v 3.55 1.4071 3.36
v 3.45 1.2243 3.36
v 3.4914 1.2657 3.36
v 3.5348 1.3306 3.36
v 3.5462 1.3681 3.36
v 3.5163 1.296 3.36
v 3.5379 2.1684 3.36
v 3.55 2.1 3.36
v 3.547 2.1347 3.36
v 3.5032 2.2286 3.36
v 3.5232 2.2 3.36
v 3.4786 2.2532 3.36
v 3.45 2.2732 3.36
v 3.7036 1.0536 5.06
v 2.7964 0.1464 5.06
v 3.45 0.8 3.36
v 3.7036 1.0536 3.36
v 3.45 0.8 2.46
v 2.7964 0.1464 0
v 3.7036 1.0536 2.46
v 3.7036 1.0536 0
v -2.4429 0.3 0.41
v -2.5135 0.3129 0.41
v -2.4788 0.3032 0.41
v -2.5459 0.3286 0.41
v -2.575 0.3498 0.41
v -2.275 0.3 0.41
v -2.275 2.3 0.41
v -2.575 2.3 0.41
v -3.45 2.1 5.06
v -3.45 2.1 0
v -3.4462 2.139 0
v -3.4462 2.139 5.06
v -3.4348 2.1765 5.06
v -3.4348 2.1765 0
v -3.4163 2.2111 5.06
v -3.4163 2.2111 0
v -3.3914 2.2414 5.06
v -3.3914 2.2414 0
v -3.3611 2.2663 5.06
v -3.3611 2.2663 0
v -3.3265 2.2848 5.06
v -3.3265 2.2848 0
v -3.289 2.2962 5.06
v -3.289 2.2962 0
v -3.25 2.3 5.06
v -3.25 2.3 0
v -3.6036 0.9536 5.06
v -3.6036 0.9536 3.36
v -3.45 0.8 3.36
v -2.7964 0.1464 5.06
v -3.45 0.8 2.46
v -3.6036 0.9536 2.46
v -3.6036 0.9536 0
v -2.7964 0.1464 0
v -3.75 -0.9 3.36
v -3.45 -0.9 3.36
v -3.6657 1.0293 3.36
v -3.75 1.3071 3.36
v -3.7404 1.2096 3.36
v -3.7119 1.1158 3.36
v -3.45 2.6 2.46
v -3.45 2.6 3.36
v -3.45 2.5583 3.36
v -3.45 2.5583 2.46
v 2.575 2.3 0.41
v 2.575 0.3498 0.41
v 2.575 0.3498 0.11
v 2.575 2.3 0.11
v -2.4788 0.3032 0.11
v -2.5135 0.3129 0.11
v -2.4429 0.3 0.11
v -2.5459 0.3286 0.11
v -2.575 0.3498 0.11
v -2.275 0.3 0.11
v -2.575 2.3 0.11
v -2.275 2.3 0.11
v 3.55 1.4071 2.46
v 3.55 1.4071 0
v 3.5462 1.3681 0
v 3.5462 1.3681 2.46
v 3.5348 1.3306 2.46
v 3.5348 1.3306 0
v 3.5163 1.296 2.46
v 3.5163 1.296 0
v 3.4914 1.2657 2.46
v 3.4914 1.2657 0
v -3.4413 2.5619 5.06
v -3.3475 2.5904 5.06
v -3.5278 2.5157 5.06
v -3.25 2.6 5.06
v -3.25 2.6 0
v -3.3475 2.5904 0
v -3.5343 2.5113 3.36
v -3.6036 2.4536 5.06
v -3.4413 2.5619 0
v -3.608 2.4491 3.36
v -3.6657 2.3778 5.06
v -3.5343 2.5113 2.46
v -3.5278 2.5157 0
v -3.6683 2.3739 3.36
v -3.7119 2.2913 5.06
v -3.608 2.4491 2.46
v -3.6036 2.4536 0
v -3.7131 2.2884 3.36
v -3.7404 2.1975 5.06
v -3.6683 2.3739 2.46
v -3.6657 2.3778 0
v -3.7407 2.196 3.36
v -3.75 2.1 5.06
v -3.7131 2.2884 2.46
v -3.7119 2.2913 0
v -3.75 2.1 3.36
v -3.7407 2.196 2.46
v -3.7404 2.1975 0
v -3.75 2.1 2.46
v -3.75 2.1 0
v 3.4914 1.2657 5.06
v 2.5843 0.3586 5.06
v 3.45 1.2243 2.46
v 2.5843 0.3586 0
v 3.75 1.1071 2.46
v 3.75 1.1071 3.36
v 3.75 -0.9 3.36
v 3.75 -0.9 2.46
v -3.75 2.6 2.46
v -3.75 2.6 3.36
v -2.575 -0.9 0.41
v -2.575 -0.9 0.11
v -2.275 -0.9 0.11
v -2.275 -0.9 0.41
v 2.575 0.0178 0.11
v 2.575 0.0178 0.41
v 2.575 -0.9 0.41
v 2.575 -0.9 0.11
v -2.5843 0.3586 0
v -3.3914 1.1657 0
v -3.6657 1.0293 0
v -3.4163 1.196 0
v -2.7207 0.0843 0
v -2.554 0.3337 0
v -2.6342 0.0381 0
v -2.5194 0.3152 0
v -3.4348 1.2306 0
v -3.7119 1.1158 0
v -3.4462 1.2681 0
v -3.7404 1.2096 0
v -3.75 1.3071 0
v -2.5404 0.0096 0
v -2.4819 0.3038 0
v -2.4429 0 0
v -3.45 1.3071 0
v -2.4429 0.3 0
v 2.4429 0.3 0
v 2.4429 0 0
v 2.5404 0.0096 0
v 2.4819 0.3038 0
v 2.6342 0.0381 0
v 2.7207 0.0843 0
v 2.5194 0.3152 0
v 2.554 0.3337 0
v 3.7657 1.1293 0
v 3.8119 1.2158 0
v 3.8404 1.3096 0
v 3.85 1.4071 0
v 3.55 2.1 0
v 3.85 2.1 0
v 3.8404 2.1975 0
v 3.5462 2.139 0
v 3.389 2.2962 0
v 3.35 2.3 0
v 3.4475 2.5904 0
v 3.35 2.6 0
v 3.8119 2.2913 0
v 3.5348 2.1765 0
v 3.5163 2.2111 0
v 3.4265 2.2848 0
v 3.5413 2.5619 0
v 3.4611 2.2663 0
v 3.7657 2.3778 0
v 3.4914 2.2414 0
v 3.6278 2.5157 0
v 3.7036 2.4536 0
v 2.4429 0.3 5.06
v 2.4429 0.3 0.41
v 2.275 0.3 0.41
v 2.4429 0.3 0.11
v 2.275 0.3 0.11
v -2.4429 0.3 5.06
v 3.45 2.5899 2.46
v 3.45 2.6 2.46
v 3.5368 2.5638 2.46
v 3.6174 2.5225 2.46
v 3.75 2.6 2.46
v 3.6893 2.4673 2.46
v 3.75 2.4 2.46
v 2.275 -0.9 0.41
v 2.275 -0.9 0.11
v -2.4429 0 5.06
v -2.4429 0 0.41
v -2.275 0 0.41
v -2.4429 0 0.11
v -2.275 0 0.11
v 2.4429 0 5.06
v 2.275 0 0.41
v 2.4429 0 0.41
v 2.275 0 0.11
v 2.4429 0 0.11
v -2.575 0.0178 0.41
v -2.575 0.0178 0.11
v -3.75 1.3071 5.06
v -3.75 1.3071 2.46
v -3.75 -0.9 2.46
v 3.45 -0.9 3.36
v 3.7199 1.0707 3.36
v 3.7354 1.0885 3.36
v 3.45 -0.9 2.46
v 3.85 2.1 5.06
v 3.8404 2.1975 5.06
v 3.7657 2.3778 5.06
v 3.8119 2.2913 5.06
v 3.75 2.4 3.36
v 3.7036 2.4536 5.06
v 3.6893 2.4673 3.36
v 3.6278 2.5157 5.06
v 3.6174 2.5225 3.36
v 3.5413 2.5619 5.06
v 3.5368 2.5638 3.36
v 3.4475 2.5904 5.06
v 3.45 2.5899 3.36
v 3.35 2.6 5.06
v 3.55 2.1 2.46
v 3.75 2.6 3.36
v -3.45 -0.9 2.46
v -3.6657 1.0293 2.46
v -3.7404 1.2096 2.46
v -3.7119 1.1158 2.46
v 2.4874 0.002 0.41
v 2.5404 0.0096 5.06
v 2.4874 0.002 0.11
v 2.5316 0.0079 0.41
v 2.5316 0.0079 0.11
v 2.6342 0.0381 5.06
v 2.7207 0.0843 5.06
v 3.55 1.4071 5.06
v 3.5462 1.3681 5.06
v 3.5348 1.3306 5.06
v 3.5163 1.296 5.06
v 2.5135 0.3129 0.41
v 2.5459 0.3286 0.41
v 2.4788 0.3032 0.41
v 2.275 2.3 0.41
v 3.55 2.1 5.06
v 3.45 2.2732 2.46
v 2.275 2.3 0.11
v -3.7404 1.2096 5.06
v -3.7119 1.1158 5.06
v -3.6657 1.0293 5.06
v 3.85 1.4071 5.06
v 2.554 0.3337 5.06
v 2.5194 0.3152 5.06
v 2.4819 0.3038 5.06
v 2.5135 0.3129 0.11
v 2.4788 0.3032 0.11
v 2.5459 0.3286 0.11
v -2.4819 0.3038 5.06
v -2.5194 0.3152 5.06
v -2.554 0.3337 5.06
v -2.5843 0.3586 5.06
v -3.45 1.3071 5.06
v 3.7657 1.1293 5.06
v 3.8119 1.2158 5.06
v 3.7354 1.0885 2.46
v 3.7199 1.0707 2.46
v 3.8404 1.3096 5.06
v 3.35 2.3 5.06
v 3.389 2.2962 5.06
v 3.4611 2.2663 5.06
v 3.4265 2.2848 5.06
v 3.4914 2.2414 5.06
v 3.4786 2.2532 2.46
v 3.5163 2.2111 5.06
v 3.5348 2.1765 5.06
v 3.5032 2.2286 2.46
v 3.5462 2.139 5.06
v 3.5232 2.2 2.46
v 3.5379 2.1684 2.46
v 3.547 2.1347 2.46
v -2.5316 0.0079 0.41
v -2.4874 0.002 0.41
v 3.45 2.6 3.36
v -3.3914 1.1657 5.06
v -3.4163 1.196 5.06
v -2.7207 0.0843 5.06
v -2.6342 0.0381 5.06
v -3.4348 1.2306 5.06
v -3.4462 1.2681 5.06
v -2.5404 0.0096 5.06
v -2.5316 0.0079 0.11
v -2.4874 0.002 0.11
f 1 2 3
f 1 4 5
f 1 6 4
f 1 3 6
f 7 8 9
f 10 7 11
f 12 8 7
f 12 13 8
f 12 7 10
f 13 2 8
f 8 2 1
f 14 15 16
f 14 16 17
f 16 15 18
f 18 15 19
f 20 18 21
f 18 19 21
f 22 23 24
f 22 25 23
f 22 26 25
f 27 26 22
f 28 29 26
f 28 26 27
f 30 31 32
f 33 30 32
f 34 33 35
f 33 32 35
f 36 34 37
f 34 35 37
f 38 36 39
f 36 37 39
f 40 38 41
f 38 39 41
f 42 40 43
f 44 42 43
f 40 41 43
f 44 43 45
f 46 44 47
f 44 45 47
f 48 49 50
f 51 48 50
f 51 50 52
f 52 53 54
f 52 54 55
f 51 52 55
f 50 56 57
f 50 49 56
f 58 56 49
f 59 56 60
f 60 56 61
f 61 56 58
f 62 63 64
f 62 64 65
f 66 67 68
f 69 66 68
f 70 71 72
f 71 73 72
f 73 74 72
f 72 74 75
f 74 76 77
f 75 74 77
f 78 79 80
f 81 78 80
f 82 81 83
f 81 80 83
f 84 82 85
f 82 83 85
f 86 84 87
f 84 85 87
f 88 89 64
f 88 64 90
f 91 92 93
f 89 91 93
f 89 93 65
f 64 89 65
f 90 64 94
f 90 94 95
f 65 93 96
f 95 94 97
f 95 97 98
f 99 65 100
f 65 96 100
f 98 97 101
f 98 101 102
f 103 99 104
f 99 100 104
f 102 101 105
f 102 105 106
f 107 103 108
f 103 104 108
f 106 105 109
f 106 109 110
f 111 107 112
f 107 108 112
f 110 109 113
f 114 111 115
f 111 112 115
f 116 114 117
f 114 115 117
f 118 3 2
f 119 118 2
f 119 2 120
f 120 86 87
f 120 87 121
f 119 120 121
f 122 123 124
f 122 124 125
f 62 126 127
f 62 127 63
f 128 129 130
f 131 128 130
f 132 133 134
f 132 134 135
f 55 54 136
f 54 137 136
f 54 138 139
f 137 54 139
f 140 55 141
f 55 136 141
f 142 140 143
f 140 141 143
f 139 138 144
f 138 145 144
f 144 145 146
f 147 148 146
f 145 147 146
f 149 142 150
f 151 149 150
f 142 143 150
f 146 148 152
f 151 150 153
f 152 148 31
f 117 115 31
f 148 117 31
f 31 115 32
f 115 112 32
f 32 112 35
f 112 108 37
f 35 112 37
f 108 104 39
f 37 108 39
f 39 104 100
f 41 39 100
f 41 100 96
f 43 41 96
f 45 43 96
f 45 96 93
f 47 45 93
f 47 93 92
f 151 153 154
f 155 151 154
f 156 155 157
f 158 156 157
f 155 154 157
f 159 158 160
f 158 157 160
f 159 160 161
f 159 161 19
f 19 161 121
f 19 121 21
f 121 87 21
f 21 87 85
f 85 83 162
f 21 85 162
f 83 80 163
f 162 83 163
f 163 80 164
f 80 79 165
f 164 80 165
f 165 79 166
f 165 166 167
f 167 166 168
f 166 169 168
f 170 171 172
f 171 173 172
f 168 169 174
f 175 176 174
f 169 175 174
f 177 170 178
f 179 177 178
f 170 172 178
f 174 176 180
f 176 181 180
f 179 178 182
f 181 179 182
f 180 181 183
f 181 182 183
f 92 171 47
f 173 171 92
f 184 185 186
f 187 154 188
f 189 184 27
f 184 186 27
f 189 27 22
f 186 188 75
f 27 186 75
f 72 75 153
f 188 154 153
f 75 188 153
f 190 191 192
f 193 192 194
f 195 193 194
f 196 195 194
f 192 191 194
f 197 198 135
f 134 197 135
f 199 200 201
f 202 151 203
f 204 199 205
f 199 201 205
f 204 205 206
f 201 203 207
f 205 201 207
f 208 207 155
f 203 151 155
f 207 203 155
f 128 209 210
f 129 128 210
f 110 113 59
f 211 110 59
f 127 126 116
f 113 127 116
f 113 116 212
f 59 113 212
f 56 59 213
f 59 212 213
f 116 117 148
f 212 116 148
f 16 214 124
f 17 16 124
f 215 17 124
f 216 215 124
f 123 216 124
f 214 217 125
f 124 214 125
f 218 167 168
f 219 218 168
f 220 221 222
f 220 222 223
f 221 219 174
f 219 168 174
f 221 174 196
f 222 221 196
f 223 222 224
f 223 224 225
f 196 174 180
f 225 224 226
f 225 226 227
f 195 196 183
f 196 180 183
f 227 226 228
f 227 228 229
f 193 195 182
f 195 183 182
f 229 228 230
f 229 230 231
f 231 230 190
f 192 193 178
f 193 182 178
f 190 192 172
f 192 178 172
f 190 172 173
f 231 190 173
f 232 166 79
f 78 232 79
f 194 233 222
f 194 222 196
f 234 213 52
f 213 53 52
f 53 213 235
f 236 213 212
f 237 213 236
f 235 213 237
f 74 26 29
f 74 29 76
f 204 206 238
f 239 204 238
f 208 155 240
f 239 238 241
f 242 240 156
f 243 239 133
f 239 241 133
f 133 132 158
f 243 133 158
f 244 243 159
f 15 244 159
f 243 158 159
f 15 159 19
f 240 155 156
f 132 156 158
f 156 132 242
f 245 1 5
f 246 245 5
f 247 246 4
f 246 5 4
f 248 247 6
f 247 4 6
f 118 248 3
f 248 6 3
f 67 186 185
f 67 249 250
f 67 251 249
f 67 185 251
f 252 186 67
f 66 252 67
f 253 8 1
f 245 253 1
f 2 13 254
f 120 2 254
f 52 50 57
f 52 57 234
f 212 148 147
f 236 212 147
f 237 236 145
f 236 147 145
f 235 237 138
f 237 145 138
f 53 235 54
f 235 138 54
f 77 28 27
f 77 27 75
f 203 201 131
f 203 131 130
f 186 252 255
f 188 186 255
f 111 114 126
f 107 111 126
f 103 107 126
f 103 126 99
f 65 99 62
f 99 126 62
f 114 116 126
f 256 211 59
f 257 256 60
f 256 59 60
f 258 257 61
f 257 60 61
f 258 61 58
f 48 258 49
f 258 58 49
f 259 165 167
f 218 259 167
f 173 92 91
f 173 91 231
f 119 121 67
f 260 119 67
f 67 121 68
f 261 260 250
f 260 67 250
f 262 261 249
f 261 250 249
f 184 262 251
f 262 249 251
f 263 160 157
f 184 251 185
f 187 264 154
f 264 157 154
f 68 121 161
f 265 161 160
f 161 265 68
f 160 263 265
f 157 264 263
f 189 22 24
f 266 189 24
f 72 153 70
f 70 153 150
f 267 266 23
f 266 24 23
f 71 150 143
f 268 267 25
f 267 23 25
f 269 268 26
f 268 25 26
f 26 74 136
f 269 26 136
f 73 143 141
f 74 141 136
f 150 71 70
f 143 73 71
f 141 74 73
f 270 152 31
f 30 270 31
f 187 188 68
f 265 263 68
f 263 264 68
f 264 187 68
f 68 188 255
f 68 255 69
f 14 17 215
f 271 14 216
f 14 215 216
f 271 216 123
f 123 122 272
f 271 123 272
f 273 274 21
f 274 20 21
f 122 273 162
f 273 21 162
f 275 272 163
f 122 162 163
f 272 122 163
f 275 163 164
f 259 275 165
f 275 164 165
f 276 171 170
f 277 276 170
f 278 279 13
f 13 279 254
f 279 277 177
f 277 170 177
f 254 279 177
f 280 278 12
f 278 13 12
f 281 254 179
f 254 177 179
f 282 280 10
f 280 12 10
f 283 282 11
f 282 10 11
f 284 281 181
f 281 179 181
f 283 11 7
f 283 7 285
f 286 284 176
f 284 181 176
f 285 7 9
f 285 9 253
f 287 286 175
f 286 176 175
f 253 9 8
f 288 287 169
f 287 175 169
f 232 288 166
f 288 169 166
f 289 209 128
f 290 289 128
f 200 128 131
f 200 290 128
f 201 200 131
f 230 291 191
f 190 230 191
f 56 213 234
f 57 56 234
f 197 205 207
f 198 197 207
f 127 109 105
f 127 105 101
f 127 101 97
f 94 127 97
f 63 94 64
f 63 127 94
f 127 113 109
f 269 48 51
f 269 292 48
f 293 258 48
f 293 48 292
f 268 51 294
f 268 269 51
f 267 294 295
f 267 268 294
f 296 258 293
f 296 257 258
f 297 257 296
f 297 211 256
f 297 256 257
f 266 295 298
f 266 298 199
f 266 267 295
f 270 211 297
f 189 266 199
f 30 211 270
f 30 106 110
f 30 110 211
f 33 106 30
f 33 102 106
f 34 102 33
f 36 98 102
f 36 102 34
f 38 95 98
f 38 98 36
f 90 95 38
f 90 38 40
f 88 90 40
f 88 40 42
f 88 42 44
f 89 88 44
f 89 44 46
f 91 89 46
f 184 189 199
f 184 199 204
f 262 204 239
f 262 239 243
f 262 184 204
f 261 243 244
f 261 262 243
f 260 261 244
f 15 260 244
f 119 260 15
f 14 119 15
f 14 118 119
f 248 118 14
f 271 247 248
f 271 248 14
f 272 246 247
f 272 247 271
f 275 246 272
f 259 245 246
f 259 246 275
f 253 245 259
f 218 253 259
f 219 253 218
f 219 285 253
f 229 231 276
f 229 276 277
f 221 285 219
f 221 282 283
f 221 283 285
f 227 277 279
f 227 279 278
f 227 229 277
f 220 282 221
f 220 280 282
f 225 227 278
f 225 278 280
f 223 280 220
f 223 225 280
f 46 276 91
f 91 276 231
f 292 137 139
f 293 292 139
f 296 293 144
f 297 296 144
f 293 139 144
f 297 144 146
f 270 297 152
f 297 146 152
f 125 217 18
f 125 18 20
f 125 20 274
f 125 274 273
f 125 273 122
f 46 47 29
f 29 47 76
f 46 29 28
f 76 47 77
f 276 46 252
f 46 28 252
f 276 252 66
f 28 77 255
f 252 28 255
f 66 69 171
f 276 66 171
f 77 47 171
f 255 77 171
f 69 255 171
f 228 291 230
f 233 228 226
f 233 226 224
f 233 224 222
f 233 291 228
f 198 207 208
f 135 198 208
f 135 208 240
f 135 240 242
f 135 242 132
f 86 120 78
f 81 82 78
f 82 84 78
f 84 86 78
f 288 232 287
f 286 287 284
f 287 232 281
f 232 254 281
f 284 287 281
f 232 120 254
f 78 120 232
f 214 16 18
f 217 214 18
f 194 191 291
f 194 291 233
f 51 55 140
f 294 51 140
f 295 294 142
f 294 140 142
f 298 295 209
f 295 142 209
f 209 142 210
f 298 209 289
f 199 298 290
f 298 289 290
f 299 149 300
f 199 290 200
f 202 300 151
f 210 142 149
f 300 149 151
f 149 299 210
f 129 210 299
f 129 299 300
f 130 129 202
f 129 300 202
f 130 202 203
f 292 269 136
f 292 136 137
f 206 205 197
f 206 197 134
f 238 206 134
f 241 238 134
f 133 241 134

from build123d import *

# Parameters (mm, degrees)
EXTRUDE_1_DEPTH     = 5.06
CUT_EXTRUDE_1_REACH = 7.06
SKETCH_2_W          = 0.3
SKETCH_2_H          = 0.3
SKETCH_2_H_2        = 0.9
EXTRUDE_2_DEPTH     = 3.5


with BuildPart() as part:
    # 草图1 → 凸台-拉伸1 (new body)
    with BuildSketch(Plane.XY):
        with BuildLine():
            Line((-3.603553391, 0.953553391), (-2.796446609, 0.146446609))
            ThreePointArc((-2.796446609, 0.146446609), (-2.634234935, 0.038060234), (-2.442893219, 0))
            Line((-2.442893219, 0), (2.442893219, 0))
            ThreePointArc((2.442893219, 0), (2.634234935, 0.038060234), (2.796446609, 0.146446609))
            Line((2.796446609, 0.146446609), (3.703553391, 1.053553391))
            ThreePointArc((3.703553391, 1.053553391), (3.811939766, 1.215765065), (3.85, 1.407106781))
            Line((3.85, 1.407106781), (3.85, 2.1))
            ThreePointArc((3.85, 2.1), (3.703553391, 2.453553391), (3.35, 2.6))
            Line((3.35, 2.6), (-3.25, 2.6))
            ThreePointArc((-3.25, 2.6), (-3.603553391, 2.453553391), (-3.75, 2.1))
            Line((-3.75, 2.1), (-3.75, 1.307106781))
            ThreePointArc((-3.75, 1.307106781), (-3.711939766, 1.115765065), (-3.603553391, 0.953553391))
        make_face()
    extrude(amount=EXTRUDE_1_DEPTH)

    # 草图4 → 切除-拉伸1 (cut, up to next)
    with BuildSketch(Plane(origin=(0, 0, 0), x_dir=(-1, 0, 0), z_dir=(0, 0, -1)), mode=Mode.PRIVATE) as cut_extrude_1_sk1:
        with BuildLine():
            Line((-2.442893219, 0.3), (2.442893219, 0.3))
            ThreePointArc((2.442893219, 0.3), (2.519429905, 0.315224093), (2.584314575, 0.358578644))
            Line((2.584314575, 0.358578644), (3.391421356, 1.165685425))
            ThreePointArc((3.391421356, 1.165685425), (3.434775907, 1.230570095), (3.45, 1.307106781))
            Line((3.45, 1.307106781), (3.45, 2.1))
            ThreePointArc((3.45, 2.1), (3.391421356, 2.241421356), (3.25, 2.3))
            Line((3.25, 2.3), (-3.35, 2.3))
            ThreePointArc((-3.35, 2.3), (-3.491421356, 2.241421356), (-3.55, 2.1))
            Line((-3.55, 2.1), (-3.55, 1.407106781))
            ThreePointArc((-3.55, 1.407106781), (-3.534775907, 1.330570095), (-3.491421356, 1.265685425))
            Line((-3.491421356, 1.265685425), (-2.584314575, 0.358578644))
            ThreePointArc((-2.584314575, 0.358578644), (-2.519429905, 0.315224093), (-2.442893219, 0.3))
        make_face()
    cut_extrude_1_tool1 = extrude(cut_extrude_1_sk1.sketch, amount=-CUT_EXTRUDE_1_REACH, mode=Mode.PRIVATE) & part.part
    add(cut_extrude_1_tool1.solids().sort_by_distance((0.027478, 1.348077, 0))[0], mode=Mode.SUBTRACT)

    # 草图2 → 凸台-拉伸2 (add)
    with BuildSketch(Plane(origin=(0, 2.6, 0), x_dir=(1, 0, 0), z_dir=(0, 1, 0))):
        with Locations((-2.425, -0.26)):
            Rectangle(SKETCH_2_W, SKETCH_2_H)
        with Locations((-3.6, -2.91)):
            Rectangle(SKETCH_2_W, SKETCH_2_H_2)
        with Locations((3.6, -2.91)):
            Rectangle(SKETCH_2_W, SKETCH_2_H_2)
        with Locations((2.425, -0.26)):
            Rectangle(SKETCH_2_W, SKETCH_2_H)
    extrude(amount=-EXTRUDE_2_DEPTH)


solid = part.part
